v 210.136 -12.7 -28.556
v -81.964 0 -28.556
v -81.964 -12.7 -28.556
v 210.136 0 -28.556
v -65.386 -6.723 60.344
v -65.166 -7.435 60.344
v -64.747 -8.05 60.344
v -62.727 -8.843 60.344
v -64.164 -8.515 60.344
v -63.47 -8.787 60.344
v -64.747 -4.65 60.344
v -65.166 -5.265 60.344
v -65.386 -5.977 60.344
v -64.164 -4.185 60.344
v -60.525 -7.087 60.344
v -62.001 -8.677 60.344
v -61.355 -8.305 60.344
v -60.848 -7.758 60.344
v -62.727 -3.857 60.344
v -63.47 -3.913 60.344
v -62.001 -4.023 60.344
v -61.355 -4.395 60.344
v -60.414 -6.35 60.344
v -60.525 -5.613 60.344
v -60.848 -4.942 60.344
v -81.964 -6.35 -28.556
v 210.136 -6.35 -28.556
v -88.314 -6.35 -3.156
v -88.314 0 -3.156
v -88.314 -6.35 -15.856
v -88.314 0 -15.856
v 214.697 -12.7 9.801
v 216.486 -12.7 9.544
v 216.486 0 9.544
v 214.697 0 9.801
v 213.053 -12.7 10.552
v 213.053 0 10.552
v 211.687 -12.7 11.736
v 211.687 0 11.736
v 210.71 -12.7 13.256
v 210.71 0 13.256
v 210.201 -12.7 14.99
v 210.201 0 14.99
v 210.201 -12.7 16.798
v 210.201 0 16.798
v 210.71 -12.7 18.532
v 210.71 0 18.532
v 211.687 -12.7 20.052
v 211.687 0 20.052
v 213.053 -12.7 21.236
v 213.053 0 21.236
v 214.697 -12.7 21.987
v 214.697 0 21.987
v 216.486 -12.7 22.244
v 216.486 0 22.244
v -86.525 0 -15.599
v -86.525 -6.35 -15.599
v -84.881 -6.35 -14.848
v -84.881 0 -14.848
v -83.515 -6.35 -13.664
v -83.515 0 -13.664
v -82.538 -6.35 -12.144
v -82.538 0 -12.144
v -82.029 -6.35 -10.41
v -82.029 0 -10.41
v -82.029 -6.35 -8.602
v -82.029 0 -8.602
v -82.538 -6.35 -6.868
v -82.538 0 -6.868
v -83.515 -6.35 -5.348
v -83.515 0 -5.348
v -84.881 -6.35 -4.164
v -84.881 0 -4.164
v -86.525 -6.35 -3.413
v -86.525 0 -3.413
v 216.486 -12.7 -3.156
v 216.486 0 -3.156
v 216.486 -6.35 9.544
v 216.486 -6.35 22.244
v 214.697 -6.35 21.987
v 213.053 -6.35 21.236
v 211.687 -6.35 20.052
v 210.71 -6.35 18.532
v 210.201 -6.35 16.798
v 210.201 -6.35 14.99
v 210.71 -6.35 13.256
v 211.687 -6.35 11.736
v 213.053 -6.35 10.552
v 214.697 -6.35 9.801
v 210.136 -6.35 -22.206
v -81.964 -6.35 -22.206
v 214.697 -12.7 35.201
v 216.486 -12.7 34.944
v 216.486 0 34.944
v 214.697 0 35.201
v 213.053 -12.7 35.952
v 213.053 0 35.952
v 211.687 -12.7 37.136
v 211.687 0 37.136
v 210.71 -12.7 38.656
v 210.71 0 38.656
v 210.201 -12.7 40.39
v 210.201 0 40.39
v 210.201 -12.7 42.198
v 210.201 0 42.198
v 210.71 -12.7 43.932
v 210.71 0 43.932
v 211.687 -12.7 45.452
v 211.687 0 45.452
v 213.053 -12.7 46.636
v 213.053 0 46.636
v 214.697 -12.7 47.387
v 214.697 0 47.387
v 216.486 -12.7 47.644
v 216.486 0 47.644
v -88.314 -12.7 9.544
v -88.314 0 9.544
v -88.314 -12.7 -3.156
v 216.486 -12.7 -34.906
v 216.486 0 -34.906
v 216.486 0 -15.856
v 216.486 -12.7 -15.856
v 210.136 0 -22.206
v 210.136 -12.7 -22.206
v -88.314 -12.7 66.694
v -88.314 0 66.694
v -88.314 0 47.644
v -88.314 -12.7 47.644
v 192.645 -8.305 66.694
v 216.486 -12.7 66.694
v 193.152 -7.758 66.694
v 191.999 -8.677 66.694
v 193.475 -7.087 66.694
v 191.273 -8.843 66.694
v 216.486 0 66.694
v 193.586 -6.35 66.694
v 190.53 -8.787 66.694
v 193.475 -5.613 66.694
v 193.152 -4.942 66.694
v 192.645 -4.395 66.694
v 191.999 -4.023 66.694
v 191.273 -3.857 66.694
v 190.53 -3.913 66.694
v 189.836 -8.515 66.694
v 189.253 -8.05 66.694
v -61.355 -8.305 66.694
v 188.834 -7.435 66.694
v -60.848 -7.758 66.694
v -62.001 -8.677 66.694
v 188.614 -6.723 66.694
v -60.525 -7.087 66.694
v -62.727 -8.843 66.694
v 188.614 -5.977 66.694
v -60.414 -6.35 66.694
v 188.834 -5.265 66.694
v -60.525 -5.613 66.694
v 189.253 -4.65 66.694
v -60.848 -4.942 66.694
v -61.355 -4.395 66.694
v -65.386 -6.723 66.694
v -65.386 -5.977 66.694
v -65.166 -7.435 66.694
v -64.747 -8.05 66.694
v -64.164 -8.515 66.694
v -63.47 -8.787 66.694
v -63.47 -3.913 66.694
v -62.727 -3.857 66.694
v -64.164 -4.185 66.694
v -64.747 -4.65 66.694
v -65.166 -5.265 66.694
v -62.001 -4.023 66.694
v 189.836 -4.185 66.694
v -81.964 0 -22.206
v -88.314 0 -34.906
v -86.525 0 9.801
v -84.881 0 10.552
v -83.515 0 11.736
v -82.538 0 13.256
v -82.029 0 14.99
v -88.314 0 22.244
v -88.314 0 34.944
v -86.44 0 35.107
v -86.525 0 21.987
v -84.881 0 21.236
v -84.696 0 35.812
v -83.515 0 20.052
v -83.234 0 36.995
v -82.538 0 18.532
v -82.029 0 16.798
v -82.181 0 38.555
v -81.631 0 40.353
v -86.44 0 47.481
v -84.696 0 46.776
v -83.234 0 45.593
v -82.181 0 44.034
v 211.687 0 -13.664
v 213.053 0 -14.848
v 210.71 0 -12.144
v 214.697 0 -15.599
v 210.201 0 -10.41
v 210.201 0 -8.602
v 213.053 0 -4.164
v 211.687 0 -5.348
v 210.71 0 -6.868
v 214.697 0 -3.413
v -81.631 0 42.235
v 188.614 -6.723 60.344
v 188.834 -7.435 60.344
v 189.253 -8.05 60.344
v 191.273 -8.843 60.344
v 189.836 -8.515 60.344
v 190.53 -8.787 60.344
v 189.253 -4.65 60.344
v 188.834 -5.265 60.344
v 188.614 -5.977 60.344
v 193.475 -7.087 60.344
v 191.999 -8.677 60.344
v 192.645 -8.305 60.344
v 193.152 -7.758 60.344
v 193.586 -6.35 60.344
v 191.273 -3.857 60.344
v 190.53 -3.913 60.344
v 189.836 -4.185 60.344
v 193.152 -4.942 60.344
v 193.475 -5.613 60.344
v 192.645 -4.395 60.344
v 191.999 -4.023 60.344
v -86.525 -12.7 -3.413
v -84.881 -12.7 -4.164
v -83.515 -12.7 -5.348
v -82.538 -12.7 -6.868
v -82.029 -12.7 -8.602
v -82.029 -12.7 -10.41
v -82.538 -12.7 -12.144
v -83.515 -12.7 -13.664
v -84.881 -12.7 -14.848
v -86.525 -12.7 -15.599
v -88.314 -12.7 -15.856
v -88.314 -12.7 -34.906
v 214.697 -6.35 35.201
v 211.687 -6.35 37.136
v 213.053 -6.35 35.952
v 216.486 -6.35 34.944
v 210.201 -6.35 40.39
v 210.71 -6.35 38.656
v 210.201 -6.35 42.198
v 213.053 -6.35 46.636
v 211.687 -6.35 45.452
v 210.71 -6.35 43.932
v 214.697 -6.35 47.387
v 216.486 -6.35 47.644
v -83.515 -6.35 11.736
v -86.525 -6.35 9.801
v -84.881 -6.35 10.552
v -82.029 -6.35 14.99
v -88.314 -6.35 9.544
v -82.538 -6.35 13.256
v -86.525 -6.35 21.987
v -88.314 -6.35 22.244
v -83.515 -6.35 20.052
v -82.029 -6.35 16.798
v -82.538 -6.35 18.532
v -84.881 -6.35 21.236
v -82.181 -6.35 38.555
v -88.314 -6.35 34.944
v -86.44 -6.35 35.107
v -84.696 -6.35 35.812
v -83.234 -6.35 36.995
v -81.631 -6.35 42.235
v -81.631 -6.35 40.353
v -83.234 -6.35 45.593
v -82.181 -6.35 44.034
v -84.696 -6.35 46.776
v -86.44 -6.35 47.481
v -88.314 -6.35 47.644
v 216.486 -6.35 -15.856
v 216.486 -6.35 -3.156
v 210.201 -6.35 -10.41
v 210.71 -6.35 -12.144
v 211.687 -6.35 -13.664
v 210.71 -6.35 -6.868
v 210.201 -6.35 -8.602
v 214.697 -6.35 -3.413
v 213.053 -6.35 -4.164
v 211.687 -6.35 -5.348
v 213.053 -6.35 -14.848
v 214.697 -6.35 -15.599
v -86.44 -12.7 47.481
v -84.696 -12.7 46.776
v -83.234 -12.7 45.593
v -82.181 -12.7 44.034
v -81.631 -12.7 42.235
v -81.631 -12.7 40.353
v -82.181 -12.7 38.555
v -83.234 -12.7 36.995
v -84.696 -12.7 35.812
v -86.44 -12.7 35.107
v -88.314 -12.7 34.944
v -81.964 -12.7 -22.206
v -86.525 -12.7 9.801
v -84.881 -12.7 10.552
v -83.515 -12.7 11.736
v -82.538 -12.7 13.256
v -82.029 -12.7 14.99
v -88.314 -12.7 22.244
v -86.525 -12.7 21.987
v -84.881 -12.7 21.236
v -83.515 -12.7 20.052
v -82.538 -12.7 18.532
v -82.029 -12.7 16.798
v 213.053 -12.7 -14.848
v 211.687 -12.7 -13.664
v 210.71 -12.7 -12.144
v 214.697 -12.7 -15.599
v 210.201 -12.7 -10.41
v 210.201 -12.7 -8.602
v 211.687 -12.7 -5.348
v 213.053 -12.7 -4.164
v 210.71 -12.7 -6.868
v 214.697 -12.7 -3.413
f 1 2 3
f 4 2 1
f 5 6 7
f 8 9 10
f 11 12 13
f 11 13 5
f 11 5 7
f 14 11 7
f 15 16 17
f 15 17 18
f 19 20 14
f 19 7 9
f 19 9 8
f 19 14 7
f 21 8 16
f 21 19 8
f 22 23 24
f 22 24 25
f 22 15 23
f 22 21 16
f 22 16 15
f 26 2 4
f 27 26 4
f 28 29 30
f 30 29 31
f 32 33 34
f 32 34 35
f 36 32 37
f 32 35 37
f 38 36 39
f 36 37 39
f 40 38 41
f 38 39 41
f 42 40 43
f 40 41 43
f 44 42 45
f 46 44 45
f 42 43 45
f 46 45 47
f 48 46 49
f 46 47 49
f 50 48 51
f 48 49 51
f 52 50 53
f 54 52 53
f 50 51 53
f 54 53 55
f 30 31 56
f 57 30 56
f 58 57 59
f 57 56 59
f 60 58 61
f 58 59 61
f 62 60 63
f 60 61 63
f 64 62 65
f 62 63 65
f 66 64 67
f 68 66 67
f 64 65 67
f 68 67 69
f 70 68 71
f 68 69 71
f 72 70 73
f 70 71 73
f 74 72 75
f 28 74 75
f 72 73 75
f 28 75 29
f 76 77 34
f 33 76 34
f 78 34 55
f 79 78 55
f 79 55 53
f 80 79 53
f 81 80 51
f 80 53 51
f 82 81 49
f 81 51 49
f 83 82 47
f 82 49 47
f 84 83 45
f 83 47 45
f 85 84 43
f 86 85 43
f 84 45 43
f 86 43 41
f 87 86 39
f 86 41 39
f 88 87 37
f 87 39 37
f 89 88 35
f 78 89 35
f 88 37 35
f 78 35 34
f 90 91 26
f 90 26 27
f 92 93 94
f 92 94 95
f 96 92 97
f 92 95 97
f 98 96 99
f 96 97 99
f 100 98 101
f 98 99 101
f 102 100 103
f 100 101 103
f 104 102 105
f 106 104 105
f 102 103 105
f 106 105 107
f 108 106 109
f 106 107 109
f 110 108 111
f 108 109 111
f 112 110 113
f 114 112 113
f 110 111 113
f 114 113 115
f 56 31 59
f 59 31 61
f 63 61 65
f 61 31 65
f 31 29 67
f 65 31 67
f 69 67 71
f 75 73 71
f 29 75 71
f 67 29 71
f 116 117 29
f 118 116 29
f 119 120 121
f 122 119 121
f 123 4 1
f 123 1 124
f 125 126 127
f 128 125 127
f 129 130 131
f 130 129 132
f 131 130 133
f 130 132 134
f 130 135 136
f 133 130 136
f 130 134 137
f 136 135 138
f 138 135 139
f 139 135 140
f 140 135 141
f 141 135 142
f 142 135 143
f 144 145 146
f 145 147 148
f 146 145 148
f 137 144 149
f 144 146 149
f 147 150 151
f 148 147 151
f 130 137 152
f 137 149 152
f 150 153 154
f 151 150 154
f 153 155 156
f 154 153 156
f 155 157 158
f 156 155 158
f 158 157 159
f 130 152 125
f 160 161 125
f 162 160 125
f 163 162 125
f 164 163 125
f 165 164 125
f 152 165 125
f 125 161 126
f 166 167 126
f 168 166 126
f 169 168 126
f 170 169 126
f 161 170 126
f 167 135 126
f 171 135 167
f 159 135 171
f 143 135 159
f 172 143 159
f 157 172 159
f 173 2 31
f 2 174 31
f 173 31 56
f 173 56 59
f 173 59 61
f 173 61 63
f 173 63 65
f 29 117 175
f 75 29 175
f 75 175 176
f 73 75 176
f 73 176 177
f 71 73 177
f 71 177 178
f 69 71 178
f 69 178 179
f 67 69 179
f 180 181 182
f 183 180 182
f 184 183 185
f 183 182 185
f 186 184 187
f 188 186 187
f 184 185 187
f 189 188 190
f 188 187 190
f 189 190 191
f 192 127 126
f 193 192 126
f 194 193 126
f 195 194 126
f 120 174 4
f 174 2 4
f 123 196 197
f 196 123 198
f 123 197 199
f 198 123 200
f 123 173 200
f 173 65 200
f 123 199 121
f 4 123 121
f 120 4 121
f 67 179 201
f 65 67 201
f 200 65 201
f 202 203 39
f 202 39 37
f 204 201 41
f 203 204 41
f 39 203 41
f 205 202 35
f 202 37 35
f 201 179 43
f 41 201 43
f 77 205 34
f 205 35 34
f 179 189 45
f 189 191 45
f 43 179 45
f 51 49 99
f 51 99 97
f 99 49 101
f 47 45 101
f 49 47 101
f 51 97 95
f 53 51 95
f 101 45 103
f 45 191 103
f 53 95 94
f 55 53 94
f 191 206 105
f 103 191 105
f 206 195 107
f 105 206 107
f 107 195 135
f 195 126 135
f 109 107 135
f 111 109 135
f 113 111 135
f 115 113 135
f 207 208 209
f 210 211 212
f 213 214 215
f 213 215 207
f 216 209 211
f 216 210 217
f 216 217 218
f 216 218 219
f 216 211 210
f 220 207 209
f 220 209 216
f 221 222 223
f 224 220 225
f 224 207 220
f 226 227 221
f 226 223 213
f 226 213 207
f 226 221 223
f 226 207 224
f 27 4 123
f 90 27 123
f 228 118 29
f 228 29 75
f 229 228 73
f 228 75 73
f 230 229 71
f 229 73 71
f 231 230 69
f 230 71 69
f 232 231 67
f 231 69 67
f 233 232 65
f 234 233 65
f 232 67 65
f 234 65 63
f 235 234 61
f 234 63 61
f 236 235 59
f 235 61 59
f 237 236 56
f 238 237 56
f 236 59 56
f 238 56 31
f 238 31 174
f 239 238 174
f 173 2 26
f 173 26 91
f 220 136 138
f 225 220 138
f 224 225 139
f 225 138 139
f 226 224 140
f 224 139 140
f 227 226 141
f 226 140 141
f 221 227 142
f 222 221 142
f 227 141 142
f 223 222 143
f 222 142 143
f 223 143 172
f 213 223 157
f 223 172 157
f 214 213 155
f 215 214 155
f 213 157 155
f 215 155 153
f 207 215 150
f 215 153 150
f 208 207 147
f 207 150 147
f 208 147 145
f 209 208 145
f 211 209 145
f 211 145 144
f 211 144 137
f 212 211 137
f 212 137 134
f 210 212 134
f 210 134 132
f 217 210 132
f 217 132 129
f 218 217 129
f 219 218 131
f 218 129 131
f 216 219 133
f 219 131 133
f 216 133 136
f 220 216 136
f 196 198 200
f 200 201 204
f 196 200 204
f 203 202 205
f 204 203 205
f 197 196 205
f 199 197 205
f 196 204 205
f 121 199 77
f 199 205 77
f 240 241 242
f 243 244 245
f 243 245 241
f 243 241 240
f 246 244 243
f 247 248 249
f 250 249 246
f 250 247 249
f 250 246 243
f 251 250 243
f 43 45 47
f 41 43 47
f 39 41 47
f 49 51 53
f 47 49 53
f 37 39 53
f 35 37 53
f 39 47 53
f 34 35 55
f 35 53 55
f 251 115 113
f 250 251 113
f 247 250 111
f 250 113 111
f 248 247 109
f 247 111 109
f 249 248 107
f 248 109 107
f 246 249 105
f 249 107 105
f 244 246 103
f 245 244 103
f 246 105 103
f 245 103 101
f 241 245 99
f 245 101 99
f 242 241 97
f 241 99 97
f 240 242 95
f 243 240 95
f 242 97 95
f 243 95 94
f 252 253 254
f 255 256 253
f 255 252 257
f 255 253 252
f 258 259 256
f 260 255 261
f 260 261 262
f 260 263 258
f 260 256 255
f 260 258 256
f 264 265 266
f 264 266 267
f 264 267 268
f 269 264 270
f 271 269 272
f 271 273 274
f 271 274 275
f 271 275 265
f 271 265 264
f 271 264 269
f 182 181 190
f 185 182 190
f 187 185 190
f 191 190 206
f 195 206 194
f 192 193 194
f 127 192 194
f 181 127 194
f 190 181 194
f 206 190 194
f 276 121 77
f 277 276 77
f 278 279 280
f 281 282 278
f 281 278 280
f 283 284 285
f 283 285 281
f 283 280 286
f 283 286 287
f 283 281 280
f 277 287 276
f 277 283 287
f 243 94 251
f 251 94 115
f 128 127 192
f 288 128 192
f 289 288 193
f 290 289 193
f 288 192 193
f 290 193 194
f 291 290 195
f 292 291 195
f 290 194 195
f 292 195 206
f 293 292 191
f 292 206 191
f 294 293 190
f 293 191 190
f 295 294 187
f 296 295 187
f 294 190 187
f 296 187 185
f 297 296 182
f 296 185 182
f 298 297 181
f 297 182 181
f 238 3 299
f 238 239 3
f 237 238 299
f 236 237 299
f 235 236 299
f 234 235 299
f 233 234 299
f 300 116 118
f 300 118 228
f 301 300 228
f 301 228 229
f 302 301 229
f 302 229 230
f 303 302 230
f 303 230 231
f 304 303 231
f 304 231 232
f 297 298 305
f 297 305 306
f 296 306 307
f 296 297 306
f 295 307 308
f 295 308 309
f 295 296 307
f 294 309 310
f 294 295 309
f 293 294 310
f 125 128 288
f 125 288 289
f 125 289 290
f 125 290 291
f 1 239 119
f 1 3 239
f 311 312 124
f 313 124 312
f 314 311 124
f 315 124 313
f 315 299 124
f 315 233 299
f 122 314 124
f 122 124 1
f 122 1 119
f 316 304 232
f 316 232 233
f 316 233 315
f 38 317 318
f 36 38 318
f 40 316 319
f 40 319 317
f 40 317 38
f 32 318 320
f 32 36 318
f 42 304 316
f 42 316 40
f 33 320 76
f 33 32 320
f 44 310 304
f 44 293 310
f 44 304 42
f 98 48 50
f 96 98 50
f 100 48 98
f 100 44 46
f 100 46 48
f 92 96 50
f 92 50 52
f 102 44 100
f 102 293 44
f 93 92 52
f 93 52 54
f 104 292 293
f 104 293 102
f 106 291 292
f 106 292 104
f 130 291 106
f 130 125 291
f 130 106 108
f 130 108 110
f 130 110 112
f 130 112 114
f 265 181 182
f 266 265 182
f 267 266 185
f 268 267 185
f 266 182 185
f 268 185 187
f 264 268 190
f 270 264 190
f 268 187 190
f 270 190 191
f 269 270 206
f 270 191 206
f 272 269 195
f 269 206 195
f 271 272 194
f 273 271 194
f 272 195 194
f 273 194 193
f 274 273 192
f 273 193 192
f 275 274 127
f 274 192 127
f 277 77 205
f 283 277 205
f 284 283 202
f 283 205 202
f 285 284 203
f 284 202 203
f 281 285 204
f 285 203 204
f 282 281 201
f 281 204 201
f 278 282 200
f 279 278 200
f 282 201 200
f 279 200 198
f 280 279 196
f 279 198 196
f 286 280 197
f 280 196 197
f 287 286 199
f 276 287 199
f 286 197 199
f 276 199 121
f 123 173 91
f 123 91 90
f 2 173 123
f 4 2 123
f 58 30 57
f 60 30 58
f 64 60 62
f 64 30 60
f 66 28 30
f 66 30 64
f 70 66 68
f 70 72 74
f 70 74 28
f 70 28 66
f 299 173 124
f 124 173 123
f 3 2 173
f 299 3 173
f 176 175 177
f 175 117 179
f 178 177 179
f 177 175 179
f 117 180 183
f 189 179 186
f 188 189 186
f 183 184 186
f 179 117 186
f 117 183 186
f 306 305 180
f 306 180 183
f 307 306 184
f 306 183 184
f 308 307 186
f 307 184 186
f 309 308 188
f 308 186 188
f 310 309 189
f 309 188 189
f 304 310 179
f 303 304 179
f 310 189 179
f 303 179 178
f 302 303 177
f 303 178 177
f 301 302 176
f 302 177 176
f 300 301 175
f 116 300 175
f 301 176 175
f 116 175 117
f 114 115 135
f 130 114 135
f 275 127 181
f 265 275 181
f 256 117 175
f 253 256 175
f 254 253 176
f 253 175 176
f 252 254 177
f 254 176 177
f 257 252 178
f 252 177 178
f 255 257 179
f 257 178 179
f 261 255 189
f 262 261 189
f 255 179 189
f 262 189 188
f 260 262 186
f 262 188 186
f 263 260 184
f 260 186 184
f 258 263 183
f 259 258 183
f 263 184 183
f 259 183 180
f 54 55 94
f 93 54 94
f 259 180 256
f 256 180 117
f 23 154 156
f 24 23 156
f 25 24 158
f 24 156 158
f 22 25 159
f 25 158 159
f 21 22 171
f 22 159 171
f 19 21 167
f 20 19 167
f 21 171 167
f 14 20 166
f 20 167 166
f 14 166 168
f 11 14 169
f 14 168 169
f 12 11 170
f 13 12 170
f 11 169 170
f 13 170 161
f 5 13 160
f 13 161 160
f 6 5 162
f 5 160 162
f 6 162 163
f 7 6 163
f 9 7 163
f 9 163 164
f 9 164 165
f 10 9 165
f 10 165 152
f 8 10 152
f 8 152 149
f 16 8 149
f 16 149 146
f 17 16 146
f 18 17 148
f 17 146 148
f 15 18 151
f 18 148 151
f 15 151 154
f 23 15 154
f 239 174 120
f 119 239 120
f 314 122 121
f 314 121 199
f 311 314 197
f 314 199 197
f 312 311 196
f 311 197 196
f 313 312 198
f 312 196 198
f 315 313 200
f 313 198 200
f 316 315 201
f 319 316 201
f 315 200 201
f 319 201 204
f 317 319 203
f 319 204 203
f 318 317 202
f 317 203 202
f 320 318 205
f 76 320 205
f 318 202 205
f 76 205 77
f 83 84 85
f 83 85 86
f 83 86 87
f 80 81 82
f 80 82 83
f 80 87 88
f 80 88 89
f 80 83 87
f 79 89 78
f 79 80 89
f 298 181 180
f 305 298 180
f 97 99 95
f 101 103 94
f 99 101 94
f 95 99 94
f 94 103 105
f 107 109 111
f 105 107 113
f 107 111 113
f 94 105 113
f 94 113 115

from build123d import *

# Parameters (mm, degrees)
F0_W     = 292.1
F0_H     = 6.35
F1_DEPTH = 6.35
F2_DEPTH = 6.35
F3_DEPTH = 12.7
F4_R     = 2.5
F5_DEPTH = 6.35


with BuildPart() as f1:
    # F0 (on Front) → F1 (new body)
    with BuildSketch(Plane.XZ):
        with Locations((64.085933, -25.380944)):
            Rectangle(F0_W, F0_H)
    extrude(amount=F1_DEPTH)


with BuildPart() as f2:
    # F0 (on Front) → F2 (new body)
    with BuildSketch(Plane.XZ):
        with BuildLine():
            ThreePointArc((-88.314067, -15.855944), (-81.964067, -9.505944), (-88.314067, -3.155944))
            Line((-88.314067, -3.155944), (-88.314067, -15.855944))
        make_face()
        with BuildLine():
            ThreePointArc((-88.314067, 9.544056), (-81.964067, 15.894056), (-88.314067, 22.244056))
            Line((-88.314067, 22.244056), (-88.314067, 9.544056))
        make_face()
        with BuildLine():
            ThreePointArc((-88.314067, 34.944056), (-81.561473, 41.294056), (-88.314067, 47.644056))
            Line((-88.314067, 47.644056), (-88.314067, 34.944056))
        make_face()
        with BuildLine():
            Line((216.485933, 34.944056), (216.485933, 47.644056))
            ThreePointArc((216.485933, 47.644056), (210.135933, 41.294056), (216.485933, 34.944056))
        make_face()
        with BuildLine():
            Line((216.485933, 9.544056), (216.485933, 22.244056))
            ThreePointArc((216.485933, 22.244056), (210.135933, 15.894056), (216.485933, 9.544056))
        make_face()
        with BuildLine():
            Line((216.485933, -15.855944), (216.485933, -3.155944))
            ThreePointArc((216.485933, -3.155944), (210.135933, -9.505944), (216.485933, -15.855944))
        make_face()
    extrude(amount=F2_DEPTH)


with BuildPart() as f3:
    # F0 (on Front) → F3 (new body)
    with BuildSketch(Plane.XZ):
        with BuildLine():
            Line((216.485933, 66.694056), (-88.314067, 66.694056))
            Line((-88.314067, 66.694056), (-88.314067, 47.644056))
            ThreePointArc((-88.314067, 47.644056), (-81.561473, 41.294056), (-88.314067, 34.944056))
            Line((-88.314067, 34.944056), (-88.314067, 22.244056))
            ThreePointArc((-88.314067, 22.244056), (-81.964067, 15.894056), (-88.314067, 9.544056))
            Line((-88.314067, 9.544056), (-88.314067, -3.155944))
            ThreePointArc((-88.314067, -3.155944), (-81.964067, -9.505944), (-88.314067, -15.855944))
            Line((-88.314067, -15.855944), (-88.314067, -34.905944))
            Line((-88.314067, -34.905944), (216.485933, -34.905944))
            Line((216.485933, -34.905944), (216.485933, -15.855944))
            ThreePointArc((216.485933, -15.855944), (210.135933, -9.505944), (216.485933, -3.155944))
            Line((216.485933, -3.155944), (216.485933, 9.544056))
            ThreePointArc((216.485933, 9.544056), (210.135933, 15.894056), (216.485933, 22.244056))
            Line((216.485933, 22.244056), (216.485933, 34.944056))
            ThreePointArc((216.485933, 34.944056), (210.135933, 41.294056), (216.485933, 47.644056))
            Line((216.485933, 47.644056), (216.485933, 66.694056))
        make_face()
        with Locations((64.085933, -25.380944)):
            Rectangle(F0_W, F0_H, mode=Mode.SUBTRACT)
    extrude(amount=F3_DEPTH)

    # F4 (on face) → F5 (cut)
    with BuildSketch(Plane.XY.offset(66.694056)):
        with Locations((191.085933, -6.35)):
            Circle(F4_R)
        with Locations((-62.914067, -6.35)):
            Circle(F4_R)
    extrude(amount=-F5_DEPTH, mode=Mode.SUBTRACT)


solid = Compound([f1.part, f2.part, f3.part])
